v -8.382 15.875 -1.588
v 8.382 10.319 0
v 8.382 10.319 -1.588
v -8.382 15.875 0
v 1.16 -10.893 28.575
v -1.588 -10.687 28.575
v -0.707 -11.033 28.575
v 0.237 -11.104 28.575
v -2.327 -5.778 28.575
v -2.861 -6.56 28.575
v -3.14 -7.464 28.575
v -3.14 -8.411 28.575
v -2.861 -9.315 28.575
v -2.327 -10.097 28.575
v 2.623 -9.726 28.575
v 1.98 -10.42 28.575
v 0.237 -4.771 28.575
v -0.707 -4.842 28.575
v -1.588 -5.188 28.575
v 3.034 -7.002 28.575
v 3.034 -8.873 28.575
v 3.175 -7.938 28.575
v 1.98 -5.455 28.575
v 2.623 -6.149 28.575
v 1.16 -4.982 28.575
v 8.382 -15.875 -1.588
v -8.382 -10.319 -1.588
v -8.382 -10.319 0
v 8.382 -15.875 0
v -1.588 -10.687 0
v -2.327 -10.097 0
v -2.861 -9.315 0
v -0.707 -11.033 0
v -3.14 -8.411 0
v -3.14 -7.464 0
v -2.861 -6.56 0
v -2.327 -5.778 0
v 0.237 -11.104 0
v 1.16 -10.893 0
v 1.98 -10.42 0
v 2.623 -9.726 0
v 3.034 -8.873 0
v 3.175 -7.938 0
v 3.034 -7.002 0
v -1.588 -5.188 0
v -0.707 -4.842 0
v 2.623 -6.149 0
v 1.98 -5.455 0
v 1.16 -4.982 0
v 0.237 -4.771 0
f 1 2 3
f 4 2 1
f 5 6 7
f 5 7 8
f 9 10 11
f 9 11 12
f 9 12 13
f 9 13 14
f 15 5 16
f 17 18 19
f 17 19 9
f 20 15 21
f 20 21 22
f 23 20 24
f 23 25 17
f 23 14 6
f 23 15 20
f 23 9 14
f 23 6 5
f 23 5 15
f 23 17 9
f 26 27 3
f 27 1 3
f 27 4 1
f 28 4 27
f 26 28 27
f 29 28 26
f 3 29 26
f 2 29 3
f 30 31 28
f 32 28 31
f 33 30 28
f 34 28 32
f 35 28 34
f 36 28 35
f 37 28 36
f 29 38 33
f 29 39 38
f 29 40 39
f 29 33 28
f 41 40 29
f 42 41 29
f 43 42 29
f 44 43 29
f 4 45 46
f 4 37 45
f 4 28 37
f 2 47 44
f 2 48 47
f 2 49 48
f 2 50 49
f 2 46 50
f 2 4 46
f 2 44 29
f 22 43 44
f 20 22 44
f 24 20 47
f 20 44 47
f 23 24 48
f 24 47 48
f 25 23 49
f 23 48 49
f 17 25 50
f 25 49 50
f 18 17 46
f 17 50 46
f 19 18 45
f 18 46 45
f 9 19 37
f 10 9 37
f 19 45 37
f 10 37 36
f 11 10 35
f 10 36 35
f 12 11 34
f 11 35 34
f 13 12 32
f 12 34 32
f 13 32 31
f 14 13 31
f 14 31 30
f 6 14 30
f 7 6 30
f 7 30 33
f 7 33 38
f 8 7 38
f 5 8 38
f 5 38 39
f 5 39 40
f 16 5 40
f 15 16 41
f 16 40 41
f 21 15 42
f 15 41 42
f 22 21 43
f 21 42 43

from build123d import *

# Parameters (mm, degrees)
F1_DEPTH = 1.5875
F2_R     = 3.175
F3_DEPTH = 28.575


with BuildPart() as f1:
    # F0 (on Top) → F1 (new body)
    with BuildSketch(Plane.XY):
        Polygon((-8.382, -10.31875), (8.382, -15.875), (8.382, 10.31875), (-8.382, 15.875), align=None)
    extrude(amount=-F1_DEPTH)

    # F2 (on Top) → F3 (join)
    with BuildSketch(Plane.XY):
        with Locations((0, -7.9375)):
            Circle(F2_R)
    extrude(amount=F3_DEPTH)


solid = f1.part
